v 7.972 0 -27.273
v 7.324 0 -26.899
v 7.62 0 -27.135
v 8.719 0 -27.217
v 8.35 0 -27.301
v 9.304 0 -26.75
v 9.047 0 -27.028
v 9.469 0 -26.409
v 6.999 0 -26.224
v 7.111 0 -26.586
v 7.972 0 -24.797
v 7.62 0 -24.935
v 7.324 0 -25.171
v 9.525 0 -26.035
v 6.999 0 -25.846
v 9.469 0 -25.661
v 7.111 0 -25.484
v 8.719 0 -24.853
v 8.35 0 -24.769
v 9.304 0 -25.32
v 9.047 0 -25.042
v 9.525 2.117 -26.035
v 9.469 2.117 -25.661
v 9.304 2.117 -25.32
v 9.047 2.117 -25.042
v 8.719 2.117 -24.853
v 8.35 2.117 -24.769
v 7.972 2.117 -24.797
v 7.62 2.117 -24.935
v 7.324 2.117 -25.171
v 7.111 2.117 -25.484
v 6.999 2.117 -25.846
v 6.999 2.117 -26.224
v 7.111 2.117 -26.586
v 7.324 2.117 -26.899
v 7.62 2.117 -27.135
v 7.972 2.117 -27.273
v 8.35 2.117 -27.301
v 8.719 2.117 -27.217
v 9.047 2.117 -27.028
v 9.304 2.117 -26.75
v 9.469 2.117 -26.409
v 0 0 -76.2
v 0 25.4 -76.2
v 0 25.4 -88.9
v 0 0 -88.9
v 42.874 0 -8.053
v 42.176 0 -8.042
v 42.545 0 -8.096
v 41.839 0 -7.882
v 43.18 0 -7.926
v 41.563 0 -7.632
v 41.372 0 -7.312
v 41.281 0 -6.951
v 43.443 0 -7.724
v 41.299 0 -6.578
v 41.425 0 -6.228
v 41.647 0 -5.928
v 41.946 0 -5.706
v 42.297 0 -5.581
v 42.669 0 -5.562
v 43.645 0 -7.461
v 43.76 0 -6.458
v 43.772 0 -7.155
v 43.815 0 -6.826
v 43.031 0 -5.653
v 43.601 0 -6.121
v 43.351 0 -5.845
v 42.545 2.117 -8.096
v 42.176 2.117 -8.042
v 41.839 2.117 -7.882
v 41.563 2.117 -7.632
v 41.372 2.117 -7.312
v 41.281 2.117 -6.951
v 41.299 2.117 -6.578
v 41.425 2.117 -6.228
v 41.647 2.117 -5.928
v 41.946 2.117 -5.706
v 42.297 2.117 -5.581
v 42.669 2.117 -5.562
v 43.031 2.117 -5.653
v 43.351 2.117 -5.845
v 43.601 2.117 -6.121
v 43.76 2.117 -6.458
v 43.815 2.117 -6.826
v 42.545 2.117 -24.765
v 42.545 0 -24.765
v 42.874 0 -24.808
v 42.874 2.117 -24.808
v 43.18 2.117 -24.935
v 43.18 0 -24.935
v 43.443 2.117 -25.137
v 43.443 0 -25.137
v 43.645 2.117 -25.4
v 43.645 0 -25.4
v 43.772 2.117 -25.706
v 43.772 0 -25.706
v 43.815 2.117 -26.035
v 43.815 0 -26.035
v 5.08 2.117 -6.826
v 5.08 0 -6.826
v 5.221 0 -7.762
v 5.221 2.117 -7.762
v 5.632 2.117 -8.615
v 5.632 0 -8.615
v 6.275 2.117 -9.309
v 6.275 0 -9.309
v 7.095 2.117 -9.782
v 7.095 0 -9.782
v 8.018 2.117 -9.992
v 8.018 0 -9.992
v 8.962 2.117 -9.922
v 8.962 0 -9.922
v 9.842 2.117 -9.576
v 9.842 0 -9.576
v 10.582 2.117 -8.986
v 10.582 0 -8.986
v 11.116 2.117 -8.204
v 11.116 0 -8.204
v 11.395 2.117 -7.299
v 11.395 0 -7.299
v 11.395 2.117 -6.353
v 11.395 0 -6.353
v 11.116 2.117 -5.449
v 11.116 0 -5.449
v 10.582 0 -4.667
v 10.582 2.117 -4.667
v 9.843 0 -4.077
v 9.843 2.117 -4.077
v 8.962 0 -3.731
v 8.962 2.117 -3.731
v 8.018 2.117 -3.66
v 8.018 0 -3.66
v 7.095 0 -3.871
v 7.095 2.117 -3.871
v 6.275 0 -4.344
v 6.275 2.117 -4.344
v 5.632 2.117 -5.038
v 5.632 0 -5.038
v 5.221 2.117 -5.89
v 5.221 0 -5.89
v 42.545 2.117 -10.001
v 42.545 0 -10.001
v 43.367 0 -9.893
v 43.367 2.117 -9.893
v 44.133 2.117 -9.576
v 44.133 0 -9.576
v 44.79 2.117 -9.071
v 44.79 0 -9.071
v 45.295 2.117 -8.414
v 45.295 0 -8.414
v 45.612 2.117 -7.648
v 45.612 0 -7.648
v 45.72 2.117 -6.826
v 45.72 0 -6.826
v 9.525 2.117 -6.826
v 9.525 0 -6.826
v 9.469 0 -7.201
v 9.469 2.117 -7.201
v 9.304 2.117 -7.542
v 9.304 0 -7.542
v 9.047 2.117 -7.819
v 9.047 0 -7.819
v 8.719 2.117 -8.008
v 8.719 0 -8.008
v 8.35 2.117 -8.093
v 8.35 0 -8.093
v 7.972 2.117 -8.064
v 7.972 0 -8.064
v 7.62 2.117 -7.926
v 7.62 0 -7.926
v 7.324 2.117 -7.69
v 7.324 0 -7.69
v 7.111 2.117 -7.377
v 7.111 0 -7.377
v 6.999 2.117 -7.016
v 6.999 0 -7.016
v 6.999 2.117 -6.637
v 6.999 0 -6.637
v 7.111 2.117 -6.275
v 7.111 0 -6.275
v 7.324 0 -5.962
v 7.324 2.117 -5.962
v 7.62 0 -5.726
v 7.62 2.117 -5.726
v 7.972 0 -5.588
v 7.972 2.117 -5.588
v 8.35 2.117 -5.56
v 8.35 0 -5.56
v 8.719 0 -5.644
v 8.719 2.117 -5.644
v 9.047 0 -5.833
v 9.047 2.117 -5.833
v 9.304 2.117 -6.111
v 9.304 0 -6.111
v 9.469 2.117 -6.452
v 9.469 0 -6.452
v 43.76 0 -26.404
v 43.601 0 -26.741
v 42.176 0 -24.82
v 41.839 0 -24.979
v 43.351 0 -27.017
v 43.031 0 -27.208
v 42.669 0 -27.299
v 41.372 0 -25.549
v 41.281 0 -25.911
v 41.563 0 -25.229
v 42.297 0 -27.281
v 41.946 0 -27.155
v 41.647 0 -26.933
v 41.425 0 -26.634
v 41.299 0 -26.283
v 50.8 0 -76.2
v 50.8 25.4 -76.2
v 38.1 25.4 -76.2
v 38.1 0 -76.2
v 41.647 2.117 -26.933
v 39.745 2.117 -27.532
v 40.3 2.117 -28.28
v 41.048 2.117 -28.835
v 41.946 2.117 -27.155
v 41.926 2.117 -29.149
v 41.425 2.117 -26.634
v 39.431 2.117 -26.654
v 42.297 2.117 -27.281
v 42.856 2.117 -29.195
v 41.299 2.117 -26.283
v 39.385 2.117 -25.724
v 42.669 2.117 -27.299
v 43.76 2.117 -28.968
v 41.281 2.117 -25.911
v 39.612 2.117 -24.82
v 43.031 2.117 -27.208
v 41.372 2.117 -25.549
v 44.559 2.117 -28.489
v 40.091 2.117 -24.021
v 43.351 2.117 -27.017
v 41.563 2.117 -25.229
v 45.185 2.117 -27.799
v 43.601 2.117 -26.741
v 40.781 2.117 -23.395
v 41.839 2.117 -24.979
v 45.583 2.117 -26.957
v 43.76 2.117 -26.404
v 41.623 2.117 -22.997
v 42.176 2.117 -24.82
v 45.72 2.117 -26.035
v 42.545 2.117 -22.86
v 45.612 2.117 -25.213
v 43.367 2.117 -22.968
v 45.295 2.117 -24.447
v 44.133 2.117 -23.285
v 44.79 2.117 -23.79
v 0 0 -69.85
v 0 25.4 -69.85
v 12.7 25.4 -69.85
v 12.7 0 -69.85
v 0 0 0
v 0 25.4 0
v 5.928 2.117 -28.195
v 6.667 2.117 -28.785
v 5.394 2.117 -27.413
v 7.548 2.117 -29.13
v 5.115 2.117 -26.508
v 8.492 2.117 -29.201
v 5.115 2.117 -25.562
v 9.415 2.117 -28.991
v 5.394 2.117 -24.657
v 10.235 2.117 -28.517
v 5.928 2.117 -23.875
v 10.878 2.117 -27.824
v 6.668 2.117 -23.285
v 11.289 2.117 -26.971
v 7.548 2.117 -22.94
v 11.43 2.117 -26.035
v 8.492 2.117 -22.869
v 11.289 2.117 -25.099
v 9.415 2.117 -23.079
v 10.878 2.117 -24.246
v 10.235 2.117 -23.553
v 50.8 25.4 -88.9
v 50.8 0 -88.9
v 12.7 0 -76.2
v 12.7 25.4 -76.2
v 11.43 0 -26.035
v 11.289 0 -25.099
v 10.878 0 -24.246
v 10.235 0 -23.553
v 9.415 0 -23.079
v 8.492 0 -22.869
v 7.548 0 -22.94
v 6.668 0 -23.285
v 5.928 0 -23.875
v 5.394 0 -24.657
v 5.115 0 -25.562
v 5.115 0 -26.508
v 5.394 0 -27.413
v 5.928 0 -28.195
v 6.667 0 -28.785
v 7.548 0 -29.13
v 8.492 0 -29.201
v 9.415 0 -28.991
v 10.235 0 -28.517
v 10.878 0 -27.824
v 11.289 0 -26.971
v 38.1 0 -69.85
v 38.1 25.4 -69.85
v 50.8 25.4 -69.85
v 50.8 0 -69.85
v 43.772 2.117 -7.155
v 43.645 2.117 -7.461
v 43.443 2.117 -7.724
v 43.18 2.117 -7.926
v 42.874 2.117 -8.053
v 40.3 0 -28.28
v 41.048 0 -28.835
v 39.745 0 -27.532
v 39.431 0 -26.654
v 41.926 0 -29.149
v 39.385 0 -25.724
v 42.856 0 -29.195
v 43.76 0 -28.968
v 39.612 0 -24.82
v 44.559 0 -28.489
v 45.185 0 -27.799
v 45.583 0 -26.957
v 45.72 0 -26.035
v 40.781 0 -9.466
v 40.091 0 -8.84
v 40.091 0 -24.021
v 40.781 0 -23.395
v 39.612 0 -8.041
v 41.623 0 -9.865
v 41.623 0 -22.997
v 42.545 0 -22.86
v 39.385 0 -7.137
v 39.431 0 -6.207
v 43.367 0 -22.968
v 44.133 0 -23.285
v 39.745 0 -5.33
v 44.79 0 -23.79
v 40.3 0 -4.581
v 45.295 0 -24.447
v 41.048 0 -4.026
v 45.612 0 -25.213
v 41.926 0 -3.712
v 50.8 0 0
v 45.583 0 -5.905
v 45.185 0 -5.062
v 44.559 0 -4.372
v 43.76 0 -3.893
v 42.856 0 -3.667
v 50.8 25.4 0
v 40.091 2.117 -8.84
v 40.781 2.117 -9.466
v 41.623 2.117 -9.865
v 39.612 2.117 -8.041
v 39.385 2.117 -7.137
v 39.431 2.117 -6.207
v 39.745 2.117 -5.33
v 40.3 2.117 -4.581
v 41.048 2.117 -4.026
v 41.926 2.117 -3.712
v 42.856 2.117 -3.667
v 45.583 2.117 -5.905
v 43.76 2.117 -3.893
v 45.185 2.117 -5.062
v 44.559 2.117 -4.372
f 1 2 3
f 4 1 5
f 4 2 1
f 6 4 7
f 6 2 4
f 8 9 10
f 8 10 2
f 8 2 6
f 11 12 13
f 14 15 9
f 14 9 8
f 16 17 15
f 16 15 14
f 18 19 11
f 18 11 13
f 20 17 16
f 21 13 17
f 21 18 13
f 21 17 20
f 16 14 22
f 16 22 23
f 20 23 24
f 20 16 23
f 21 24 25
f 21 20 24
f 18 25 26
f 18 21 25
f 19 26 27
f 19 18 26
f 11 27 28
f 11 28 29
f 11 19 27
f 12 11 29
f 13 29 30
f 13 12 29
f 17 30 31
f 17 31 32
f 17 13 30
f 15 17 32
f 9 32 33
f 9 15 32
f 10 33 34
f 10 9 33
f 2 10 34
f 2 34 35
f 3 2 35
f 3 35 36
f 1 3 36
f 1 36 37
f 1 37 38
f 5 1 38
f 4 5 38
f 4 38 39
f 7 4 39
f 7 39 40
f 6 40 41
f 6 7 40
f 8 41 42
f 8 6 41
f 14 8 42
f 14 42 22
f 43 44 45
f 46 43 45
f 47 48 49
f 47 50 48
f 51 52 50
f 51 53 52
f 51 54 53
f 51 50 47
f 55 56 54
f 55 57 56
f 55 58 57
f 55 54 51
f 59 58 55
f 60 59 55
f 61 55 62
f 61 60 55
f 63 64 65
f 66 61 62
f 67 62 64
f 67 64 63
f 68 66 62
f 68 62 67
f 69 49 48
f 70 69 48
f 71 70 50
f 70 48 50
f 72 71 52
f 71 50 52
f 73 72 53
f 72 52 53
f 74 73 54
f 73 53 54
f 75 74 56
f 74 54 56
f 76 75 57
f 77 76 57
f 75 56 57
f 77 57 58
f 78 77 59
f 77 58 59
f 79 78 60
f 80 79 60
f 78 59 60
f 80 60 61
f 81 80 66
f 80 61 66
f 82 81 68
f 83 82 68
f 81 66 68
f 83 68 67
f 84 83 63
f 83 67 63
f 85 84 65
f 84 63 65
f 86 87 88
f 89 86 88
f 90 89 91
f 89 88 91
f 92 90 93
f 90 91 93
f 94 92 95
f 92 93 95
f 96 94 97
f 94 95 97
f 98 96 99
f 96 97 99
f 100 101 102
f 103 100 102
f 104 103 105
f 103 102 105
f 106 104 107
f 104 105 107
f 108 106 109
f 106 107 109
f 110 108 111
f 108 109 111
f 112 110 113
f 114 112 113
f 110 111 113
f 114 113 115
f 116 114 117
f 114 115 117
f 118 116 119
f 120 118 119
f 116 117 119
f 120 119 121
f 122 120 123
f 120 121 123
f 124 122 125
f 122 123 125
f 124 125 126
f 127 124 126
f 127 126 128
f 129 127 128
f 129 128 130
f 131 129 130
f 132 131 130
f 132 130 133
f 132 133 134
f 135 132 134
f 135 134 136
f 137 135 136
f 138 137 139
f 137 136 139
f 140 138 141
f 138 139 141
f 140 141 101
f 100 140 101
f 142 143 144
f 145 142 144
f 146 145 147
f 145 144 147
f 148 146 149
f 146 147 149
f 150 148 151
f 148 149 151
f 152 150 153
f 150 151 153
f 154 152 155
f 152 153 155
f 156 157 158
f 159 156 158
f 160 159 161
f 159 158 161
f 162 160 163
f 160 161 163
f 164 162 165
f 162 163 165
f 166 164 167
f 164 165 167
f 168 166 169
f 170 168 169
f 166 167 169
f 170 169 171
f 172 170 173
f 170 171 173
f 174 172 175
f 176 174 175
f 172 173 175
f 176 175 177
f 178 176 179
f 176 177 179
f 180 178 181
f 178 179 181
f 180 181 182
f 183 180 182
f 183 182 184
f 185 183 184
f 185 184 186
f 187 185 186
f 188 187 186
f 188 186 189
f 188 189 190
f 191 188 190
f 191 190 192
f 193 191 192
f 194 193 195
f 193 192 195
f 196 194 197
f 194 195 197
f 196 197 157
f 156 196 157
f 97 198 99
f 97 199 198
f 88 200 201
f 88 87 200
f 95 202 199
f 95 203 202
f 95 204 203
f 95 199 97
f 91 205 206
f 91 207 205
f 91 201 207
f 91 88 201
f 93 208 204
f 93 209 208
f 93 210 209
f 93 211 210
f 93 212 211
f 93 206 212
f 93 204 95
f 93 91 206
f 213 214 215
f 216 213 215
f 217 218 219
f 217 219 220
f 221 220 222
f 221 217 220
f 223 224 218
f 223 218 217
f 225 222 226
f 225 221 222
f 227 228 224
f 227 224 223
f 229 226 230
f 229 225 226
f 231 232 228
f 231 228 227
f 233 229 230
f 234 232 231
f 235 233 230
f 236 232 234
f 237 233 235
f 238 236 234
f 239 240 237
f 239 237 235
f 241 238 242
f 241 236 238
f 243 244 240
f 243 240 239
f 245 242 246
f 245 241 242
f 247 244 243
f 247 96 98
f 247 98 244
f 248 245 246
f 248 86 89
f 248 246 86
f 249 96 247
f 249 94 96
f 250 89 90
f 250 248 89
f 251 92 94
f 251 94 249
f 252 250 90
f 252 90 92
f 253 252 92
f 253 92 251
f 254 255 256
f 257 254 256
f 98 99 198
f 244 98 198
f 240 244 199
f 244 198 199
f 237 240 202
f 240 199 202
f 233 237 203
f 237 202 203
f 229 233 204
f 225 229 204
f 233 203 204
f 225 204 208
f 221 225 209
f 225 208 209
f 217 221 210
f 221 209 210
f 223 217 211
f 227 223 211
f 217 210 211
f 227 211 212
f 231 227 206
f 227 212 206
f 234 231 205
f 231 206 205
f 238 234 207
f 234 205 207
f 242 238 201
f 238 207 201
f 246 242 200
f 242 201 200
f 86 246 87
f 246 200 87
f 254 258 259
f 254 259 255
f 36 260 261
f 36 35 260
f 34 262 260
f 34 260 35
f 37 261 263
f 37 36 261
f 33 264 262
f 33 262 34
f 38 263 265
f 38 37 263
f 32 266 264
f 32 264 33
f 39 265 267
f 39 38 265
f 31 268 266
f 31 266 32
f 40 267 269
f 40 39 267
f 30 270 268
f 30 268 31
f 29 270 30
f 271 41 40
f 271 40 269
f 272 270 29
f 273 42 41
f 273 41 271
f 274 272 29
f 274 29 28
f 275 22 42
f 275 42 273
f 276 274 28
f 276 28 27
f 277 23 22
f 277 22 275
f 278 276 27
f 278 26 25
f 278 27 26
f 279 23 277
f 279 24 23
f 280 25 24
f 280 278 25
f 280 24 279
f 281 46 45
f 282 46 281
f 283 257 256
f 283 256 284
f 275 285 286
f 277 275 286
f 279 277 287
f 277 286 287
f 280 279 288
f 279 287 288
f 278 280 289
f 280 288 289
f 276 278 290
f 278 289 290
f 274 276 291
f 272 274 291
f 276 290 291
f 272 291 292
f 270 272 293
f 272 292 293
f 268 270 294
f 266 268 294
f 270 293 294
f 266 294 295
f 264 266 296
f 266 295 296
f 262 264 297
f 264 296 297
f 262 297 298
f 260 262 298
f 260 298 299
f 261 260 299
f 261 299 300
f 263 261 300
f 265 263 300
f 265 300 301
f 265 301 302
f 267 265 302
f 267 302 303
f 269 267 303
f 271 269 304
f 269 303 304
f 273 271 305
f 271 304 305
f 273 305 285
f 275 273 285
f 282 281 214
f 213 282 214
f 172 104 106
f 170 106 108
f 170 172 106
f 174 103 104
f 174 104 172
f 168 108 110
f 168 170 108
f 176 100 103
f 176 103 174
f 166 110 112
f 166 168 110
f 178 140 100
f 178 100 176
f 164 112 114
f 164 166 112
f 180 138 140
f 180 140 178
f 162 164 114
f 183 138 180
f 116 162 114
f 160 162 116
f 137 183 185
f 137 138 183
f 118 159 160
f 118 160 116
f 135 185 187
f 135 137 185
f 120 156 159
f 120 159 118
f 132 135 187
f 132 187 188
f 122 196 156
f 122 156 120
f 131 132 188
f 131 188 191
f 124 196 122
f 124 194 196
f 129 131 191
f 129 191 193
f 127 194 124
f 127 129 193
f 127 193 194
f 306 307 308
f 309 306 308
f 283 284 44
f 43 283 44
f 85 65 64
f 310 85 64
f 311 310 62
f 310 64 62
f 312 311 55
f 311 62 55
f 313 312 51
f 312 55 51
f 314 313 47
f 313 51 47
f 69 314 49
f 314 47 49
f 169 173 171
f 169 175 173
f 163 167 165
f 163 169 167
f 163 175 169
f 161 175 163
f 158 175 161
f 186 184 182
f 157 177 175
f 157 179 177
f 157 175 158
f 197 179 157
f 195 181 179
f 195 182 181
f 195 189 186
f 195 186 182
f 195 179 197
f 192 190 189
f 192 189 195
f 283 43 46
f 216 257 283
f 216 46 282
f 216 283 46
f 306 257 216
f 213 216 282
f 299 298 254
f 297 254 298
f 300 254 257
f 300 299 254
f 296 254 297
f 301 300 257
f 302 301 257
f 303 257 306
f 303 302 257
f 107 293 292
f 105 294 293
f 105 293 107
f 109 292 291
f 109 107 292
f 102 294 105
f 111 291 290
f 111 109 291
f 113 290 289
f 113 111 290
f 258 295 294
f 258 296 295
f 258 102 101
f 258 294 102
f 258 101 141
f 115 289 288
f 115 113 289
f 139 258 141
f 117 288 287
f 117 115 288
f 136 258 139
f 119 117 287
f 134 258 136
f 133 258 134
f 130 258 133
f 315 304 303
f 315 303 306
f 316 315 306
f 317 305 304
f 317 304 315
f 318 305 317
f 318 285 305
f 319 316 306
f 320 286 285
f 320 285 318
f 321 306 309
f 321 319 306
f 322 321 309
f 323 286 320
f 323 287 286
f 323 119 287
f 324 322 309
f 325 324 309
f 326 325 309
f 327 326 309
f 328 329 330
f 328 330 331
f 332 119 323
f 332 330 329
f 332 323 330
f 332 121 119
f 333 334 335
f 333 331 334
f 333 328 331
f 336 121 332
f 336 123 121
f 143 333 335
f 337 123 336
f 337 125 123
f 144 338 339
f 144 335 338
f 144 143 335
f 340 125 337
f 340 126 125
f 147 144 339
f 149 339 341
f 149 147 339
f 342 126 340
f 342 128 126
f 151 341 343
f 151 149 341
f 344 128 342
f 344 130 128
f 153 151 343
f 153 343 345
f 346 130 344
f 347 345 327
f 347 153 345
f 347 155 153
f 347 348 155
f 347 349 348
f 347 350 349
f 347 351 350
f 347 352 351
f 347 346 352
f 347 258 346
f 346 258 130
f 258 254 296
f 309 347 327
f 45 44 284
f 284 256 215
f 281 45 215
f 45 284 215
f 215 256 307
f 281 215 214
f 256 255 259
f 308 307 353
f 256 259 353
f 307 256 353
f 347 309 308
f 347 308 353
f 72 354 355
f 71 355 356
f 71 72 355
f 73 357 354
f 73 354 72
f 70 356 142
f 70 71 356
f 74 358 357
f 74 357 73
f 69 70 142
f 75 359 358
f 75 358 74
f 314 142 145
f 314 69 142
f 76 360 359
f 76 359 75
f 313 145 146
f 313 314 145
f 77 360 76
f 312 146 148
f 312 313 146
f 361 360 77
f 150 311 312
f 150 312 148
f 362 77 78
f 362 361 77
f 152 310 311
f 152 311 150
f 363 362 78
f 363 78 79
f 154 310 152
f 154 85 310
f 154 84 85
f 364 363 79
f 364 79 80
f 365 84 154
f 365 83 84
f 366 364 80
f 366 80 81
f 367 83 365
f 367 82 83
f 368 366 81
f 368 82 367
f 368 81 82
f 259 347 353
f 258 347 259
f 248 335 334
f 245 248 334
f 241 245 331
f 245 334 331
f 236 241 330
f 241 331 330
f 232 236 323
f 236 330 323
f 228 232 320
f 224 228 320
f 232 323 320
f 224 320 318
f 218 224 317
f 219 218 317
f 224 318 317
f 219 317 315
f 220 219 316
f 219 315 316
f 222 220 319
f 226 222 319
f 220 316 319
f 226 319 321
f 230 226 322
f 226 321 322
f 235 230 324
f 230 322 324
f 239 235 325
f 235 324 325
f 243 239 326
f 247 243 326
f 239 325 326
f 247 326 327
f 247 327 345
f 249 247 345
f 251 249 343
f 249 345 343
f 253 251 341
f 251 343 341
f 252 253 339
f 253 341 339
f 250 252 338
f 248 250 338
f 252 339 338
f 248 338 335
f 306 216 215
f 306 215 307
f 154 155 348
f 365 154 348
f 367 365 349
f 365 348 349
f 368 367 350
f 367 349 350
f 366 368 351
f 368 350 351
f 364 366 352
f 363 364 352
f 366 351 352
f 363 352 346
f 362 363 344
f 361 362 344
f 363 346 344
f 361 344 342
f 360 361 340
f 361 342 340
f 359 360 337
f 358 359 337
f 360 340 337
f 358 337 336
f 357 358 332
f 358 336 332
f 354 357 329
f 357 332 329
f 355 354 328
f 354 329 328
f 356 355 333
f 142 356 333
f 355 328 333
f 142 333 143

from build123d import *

# Parameters (mm, degrees)
F1_DEPTH = 25.4
F2_R     = 3.175
F2_R_2   = 1.27
F3_DEPTH = 2.1166666667


with BuildPart() as f1:
    # F0 (on Front) → F1 (new body)
    with BuildSketch(Plane.XZ):
        Polygon((50.8, 0), (0, 0), (0, -69.85), (12.7, -69.85), (12.7, -76.2), (0, -76.2), (0, -88.9), (50.8, -88.9), (50.8, -76.2), (38.1, -76.2), (38.1, -69.85), (50.8, -69.85), align=None)
    extrude(amount=-F1_DEPTH)

    # F2 (on face) → F3 (cut)
    with BuildSketch(Plane.XZ):
        with BuildLine():
            ThreePointArc((11.43, -6.82625), (8.255, -3.65125), (5.08, -6.82625))
            ThreePointArc((5.08, -6.82625), (8.255, -10.00125), (11.43, -6.82625))
        make_face()
        with BuildLine():
            ThreePointArc((6.985, -6.82625), (8.255, -5.55625), (9.525, -6.82625))
            ThreePointArc((9.525, -6.82625), (8.255, -8.09625), (6.985, -6.82625))
        make_face(mode=Mode.SUBTRACT)
        with BuildLine():
            Line((45.72, -6.82625), (43.815, -6.82625))
            ThreePointArc((43.815, -6.82625), (43.4430256121, -7.7242756121), (42.545, -8.09625))
            Line((42.545, -8.09625), (42.545, -10.00125))
            ThreePointArc((42.545, -10.00125), (44.7900640303, -9.0713140303), (45.72, -6.82625))
        make_face()
        with BuildLine():
            ThreePointArc((42.545, -8.09625), (41.6469743879, -5.9282243879), (43.815, -6.82625))
            Line((43.815, -6.82625), (45.72, -6.82625))
            ThreePointArc((45.72, -6.82625), (40.2999359697, -4.5811859697), (42.545, -10.00125))
            Line((42.545, -10.00125), (42.545, -8.09625))
        make_face()
        with BuildLine():
            ThreePointArc((45.72, -26.035), (44.7900640303, -23.7899359697), (42.545, -22.86))
            ThreePointArc((42.545, -22.86), (40.2999359697, -28.2800640303), (45.72, -26.035))
        make_face()
        with BuildLine():
            ThreePointArc((43.815, -26.035), (41.6469743879, -26.9330256121), (42.545, -24.765))
            ThreePointArc((42.545, -24.765), (43.4430256121, -25.1369743879), (43.815, -26.035))
        make_face(mode=Mode.SUBTRACT)
        with Locations((8.255, -26.035)):
            Circle(F2_R)
        with Locations((8.255, -26.035)):
            Circle(F2_R_2, mode=Mode.SUBTRACT)
    extrude(amount=-F3_DEPTH, mode=Mode.SUBTRACT)


solid = f1.part
